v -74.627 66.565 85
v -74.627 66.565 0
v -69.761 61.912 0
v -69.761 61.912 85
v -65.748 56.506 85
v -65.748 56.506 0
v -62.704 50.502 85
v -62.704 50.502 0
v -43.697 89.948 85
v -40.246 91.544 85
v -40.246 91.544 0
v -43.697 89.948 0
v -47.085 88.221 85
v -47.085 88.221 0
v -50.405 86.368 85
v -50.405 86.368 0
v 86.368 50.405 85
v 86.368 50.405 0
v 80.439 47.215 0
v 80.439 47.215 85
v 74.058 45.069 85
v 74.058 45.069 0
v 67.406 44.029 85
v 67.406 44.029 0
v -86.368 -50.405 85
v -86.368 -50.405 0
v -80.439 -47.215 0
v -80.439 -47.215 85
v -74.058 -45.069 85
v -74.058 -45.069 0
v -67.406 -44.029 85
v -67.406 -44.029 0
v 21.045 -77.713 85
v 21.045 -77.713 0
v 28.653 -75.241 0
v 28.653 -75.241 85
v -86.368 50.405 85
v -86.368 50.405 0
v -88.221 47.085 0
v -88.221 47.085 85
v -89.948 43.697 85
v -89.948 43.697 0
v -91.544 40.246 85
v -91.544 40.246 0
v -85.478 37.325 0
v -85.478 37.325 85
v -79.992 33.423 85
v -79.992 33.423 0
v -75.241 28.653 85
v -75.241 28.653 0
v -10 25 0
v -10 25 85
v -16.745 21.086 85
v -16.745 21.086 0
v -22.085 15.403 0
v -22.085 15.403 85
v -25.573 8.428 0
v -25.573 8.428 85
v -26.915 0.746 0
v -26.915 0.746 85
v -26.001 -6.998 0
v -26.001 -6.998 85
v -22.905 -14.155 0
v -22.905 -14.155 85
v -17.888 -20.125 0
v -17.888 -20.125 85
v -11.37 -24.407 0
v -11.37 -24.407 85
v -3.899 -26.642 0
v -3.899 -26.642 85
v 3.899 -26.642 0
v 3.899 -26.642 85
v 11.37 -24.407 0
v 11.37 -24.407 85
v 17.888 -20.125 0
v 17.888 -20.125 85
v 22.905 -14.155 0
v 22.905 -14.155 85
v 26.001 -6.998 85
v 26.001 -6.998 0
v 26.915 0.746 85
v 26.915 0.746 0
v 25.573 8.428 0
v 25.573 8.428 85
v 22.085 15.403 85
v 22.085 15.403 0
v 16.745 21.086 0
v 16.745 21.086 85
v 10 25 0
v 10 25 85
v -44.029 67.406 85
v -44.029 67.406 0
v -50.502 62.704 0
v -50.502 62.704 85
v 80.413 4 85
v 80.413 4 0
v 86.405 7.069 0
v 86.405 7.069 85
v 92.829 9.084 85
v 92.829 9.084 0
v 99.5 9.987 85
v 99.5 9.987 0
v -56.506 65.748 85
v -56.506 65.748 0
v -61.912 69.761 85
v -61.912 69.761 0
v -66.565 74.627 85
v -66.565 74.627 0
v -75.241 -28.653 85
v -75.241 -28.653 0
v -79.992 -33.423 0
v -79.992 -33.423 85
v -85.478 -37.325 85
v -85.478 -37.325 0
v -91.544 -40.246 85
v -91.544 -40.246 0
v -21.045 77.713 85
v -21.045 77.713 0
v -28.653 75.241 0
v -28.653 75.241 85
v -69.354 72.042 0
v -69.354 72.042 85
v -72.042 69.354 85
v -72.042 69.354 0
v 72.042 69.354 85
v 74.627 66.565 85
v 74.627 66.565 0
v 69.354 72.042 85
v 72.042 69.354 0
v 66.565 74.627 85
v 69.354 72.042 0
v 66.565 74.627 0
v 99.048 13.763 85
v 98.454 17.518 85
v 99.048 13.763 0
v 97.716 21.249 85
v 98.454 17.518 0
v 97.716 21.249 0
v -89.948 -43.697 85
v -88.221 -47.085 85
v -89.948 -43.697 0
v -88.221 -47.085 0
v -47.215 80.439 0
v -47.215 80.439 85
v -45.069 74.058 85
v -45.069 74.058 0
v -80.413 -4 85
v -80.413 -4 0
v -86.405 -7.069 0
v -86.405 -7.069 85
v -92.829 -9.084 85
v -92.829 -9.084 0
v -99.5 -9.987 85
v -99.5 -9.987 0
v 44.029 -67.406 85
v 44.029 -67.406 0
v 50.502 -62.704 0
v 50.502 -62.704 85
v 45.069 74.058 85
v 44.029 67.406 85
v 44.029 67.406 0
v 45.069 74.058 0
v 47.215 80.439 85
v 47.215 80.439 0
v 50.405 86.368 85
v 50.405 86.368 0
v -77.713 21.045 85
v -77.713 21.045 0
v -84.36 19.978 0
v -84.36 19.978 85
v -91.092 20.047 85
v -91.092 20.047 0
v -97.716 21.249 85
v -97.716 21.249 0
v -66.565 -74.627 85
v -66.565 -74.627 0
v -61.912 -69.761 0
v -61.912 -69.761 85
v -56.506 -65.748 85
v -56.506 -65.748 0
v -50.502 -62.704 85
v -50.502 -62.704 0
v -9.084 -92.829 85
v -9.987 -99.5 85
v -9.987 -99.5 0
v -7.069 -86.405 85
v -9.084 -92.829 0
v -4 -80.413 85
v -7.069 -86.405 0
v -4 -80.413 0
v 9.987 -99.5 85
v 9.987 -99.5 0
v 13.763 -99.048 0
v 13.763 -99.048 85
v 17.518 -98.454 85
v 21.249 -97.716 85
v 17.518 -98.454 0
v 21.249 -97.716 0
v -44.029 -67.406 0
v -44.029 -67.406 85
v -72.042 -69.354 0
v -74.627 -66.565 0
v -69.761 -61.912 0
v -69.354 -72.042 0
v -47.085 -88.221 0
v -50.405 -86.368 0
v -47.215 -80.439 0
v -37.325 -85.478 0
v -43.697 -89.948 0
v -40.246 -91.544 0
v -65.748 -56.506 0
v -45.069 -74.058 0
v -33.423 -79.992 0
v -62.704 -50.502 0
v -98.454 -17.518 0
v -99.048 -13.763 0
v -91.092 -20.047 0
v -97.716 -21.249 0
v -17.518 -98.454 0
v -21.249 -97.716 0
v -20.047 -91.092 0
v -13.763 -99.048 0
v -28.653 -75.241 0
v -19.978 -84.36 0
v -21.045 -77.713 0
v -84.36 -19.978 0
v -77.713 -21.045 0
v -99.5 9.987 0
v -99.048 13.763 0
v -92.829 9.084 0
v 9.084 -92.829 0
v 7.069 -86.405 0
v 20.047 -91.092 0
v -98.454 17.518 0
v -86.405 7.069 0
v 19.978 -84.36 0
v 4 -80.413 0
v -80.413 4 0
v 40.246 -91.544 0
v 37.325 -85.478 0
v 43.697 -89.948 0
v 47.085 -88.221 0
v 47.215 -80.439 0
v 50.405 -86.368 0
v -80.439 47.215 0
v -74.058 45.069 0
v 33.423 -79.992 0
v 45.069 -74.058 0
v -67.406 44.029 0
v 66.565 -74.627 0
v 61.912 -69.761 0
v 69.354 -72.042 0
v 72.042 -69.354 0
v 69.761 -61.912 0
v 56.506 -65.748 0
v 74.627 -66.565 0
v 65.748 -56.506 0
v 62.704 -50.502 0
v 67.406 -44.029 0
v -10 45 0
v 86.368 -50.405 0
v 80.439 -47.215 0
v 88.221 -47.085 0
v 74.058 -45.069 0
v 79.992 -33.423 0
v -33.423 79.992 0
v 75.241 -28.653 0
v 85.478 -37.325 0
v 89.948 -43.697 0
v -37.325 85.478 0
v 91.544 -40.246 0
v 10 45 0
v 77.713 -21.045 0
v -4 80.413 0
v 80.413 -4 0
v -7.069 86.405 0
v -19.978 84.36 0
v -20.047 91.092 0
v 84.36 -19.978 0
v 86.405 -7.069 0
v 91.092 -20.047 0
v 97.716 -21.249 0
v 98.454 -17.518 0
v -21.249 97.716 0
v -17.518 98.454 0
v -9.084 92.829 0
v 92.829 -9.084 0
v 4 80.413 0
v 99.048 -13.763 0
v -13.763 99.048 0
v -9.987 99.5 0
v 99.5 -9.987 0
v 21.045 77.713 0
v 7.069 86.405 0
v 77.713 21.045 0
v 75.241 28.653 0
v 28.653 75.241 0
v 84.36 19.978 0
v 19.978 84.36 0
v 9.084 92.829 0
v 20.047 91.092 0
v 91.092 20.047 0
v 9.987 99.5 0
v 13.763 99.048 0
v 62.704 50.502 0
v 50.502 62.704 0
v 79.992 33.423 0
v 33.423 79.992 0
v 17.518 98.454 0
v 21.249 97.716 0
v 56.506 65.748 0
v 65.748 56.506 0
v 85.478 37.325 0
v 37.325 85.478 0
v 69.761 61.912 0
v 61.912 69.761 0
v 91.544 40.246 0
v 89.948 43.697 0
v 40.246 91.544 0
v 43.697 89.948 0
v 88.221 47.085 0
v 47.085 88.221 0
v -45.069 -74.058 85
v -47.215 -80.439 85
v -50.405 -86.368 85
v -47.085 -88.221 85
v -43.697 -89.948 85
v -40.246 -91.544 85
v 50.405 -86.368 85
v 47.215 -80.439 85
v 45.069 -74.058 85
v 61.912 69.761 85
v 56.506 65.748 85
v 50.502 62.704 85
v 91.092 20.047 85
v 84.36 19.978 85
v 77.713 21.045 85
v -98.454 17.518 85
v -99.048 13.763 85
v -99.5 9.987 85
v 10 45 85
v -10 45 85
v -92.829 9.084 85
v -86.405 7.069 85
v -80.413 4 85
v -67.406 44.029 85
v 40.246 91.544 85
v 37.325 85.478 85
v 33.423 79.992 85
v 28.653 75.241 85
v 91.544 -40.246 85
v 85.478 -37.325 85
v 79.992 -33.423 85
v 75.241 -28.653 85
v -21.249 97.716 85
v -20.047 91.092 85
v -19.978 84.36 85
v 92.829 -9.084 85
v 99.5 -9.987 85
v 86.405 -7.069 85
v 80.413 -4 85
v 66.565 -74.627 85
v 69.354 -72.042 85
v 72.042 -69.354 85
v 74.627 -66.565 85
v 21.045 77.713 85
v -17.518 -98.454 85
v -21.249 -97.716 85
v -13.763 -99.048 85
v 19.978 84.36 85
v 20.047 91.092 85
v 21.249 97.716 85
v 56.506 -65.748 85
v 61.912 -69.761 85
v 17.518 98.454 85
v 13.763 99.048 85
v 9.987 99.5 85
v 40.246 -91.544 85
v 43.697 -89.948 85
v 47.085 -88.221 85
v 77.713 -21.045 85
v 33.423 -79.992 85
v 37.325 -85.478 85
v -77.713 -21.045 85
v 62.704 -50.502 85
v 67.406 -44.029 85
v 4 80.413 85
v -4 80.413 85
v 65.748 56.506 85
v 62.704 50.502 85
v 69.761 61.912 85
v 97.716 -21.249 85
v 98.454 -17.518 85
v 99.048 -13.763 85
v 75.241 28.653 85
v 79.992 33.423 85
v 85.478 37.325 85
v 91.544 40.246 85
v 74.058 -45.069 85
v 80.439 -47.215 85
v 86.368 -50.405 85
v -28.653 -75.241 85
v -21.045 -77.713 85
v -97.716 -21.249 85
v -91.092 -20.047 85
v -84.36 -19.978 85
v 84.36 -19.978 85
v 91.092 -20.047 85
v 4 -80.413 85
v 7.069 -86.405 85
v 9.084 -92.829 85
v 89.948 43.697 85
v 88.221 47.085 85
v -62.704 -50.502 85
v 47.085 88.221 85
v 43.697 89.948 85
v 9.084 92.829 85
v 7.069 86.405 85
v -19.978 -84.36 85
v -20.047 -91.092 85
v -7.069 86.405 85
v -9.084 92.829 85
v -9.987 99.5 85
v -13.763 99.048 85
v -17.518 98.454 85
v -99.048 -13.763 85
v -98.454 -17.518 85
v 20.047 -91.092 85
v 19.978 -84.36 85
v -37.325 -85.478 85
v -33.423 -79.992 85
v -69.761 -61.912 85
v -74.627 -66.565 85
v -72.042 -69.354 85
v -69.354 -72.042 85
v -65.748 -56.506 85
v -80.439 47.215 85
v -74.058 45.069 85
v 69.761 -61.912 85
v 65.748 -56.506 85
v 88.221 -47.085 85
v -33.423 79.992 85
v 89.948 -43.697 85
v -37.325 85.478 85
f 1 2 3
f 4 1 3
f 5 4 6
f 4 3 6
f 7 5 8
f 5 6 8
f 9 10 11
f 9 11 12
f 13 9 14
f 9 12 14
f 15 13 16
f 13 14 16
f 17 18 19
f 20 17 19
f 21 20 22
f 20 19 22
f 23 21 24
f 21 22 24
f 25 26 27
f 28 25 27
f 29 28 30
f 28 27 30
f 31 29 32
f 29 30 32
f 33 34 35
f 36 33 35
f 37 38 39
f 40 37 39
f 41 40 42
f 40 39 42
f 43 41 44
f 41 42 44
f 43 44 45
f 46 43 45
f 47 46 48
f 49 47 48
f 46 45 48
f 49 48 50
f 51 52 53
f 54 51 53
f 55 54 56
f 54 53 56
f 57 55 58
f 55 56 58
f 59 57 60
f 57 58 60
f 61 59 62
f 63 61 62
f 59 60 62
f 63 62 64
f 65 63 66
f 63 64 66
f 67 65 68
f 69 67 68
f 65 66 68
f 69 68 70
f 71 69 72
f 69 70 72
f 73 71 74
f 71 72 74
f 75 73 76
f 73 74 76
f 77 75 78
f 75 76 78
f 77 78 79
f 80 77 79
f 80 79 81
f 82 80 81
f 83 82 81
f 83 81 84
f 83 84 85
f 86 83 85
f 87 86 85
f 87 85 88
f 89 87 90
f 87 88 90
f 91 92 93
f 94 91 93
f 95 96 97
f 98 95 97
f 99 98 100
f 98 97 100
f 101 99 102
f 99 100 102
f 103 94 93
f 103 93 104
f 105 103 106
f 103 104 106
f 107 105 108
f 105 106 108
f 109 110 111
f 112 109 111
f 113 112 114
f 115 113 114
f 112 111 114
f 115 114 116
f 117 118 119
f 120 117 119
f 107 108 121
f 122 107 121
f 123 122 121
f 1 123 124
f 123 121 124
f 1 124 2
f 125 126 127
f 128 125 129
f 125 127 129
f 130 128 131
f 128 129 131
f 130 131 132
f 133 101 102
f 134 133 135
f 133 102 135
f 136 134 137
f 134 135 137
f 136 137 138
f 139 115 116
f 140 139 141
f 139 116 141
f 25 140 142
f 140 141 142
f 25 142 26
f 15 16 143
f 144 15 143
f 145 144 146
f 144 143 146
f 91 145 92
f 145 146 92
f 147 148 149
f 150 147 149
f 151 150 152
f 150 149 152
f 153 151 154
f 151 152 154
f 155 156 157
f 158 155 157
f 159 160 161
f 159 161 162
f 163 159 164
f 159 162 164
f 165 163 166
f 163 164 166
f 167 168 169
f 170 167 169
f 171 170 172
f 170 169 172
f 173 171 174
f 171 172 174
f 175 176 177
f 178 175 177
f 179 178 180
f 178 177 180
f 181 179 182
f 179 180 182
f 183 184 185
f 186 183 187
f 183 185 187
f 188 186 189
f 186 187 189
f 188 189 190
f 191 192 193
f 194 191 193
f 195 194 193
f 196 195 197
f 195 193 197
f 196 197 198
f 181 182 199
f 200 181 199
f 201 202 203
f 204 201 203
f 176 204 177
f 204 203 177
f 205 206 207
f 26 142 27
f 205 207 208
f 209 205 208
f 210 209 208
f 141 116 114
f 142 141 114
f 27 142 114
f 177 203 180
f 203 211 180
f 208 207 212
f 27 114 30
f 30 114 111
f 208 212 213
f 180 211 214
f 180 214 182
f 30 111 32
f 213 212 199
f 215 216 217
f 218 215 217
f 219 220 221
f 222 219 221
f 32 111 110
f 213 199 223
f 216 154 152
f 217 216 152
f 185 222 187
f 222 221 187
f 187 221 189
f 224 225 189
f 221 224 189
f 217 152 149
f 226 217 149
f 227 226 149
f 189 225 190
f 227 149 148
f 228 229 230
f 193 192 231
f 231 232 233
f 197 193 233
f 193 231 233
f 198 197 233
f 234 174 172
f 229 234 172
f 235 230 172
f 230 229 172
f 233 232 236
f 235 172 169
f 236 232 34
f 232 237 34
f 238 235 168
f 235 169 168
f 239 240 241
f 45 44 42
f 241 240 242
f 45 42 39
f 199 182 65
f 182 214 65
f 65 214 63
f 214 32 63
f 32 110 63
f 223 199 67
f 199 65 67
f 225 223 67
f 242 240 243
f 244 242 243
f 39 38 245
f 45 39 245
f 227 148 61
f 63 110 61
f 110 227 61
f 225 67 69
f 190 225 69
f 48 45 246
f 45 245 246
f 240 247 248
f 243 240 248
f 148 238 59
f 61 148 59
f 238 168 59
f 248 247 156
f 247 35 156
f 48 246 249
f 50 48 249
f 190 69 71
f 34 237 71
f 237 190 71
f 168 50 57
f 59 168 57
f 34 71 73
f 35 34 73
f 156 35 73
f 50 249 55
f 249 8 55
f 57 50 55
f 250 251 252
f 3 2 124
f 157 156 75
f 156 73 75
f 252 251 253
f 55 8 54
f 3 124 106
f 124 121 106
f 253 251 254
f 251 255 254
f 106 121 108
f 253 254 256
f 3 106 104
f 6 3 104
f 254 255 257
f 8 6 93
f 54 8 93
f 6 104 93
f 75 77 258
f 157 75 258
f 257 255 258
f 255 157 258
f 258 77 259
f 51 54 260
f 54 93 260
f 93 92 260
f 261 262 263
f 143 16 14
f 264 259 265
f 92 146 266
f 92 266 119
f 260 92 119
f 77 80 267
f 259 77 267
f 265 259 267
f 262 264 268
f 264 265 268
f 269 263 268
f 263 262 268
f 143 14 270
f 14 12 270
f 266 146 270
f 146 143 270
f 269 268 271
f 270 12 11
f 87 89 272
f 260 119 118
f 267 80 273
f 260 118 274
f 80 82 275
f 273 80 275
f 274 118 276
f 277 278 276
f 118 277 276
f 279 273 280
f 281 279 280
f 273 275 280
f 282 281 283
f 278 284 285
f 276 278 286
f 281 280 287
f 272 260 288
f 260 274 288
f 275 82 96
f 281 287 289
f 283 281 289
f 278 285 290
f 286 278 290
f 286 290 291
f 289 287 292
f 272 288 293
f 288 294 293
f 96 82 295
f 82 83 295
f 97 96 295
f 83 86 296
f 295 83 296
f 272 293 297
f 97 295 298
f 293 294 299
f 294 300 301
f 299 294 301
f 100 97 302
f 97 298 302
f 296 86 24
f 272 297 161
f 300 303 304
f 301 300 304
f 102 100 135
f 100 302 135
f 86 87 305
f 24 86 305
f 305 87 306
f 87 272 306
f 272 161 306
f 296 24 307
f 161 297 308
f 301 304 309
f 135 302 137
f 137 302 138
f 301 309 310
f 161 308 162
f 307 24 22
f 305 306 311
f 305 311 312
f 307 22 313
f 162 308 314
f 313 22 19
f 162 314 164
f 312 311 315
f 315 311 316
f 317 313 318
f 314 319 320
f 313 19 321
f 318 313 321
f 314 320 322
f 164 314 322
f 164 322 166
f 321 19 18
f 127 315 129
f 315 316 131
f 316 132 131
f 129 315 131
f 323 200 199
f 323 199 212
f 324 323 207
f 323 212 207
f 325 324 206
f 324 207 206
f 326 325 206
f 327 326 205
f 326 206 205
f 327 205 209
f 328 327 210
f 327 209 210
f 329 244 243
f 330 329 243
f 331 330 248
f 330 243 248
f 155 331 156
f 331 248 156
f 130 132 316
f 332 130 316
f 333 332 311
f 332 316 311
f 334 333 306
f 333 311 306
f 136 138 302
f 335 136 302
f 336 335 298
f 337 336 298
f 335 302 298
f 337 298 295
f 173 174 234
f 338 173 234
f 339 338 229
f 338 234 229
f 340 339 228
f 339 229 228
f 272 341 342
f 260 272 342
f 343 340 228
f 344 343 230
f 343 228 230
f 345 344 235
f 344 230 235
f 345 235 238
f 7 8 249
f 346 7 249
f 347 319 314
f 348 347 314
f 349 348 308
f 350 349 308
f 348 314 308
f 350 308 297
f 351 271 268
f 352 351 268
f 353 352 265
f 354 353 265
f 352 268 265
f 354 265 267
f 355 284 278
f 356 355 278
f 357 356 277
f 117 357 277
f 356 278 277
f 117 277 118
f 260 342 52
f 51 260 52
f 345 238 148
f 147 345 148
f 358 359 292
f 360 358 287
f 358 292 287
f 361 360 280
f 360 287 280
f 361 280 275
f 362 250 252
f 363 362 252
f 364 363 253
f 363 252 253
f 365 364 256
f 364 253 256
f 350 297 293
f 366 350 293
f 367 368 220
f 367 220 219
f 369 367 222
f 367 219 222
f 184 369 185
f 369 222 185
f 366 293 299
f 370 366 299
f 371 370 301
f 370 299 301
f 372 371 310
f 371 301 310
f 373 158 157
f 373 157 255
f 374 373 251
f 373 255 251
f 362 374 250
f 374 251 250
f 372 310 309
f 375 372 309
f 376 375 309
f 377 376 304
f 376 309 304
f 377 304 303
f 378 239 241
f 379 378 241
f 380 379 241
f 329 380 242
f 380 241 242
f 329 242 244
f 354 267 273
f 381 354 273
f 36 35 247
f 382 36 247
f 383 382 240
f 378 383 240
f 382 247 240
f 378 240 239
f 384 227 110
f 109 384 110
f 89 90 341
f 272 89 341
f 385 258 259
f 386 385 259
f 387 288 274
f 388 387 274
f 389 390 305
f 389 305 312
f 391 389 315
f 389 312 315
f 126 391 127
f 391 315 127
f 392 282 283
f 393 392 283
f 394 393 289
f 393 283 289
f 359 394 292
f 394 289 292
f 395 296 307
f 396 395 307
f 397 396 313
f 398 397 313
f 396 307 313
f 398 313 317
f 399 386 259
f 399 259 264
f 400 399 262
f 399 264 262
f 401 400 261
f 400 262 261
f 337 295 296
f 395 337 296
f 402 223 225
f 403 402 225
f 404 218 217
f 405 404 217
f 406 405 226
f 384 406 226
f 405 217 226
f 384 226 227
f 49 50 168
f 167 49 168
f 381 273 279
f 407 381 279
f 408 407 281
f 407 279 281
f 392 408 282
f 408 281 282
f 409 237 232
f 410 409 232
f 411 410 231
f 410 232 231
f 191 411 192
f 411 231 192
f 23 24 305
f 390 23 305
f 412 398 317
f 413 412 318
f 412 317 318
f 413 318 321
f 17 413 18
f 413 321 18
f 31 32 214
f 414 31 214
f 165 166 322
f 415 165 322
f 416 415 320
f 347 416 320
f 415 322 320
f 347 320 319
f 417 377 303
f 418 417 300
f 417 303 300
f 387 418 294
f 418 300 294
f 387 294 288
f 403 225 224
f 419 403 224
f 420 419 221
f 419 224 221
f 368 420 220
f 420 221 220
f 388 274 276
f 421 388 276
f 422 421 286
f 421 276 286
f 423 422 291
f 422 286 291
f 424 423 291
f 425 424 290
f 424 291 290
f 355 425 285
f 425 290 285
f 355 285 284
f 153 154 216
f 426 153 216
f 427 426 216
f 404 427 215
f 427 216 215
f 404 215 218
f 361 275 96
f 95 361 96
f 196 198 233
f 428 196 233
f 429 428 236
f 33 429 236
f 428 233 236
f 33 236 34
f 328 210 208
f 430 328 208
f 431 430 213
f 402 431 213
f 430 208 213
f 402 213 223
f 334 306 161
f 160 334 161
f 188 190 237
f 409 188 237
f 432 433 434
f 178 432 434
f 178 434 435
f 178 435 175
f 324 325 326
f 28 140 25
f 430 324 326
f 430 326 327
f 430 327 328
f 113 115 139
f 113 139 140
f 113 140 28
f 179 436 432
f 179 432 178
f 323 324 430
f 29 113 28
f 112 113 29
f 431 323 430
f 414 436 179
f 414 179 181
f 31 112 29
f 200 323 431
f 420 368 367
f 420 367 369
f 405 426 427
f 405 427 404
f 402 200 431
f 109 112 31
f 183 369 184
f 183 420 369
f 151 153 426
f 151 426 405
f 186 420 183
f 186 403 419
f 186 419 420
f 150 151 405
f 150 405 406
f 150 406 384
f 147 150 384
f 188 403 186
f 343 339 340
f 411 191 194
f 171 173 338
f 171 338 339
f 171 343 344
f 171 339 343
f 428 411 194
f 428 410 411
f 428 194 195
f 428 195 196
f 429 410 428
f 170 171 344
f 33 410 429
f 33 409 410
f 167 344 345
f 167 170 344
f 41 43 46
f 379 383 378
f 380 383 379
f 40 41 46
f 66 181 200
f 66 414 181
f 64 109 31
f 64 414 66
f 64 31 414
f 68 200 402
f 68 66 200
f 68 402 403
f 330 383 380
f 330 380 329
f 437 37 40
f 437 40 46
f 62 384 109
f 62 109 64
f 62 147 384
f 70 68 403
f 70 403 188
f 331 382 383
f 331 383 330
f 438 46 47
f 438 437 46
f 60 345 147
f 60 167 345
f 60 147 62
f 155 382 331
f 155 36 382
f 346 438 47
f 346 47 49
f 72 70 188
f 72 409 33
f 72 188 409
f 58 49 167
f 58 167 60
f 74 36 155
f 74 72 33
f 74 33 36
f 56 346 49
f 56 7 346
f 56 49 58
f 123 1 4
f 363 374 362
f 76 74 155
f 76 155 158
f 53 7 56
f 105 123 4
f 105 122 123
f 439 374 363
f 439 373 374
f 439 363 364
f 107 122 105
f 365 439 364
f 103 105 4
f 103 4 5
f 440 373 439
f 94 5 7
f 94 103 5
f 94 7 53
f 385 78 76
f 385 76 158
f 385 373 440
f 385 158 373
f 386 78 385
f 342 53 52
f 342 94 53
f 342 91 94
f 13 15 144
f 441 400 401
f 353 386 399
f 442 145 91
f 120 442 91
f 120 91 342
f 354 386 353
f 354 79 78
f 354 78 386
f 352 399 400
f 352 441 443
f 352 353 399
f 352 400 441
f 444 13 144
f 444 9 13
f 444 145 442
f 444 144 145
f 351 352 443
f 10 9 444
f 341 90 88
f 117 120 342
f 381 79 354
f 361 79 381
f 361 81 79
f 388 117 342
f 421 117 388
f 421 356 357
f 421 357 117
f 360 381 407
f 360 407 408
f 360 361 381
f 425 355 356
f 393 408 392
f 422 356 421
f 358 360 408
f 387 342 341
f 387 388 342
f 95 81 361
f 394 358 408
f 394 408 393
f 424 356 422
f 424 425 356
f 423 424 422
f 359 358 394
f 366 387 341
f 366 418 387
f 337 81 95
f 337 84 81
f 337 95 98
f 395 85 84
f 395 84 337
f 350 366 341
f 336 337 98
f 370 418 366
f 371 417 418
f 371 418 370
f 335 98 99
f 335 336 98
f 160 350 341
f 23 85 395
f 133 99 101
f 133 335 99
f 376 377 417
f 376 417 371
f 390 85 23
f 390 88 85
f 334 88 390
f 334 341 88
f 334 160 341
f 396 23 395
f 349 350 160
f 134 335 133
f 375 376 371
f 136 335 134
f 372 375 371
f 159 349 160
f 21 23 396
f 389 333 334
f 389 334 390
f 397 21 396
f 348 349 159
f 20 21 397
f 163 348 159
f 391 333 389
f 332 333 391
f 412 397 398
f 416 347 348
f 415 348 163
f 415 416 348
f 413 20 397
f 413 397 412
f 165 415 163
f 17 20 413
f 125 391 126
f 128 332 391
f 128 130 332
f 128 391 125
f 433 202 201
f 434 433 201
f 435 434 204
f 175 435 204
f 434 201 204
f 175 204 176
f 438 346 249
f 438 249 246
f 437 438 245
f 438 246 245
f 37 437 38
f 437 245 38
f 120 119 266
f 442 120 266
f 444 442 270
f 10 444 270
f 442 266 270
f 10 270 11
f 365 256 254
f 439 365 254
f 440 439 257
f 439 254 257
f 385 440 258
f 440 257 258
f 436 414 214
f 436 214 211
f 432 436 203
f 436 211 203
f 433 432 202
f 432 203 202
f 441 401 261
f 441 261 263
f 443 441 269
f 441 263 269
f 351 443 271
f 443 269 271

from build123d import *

# Parameters (mm, degrees)
SKETCH1_R           = 100
BOSS_EXTRUDE1_DEPTH = 85
CUT_EXTRUDE2_DEPTH  = 85
CUT_EXTRUDE17_DEPTH = 144


with BuildPart() as part:
    # Sketch1 → Boss-Extrude1 (new body)
    with BuildSketch(Plane.XY):
        Circle(SKETCH1_R)
    extrude(amount=BOSS_EXTRUDE1_DEPTH)

    # Sketch2 → Cut-Extrude2 (cut)
    with BuildSketch(Plane.XY.offset(85)):
        with BuildLine():
            Line((0, 45), (-10, 45))
            Line((-10, 45), (-10, 25))
            ThreePointArc((-10, 25), (0, -26.925824036), (10, 25))
            Line((10, 25), (10, 45))
            Line((10, 45), (0, 45))
        make_face()
    extrude(amount=-CUT_EXTRUDE2_DEPTH, mode=Mode.SUBTRACT)

    # Sketch3 → Cut-Extrude17 (cut)
    with BuildSketch(Plane.XY):
        with BuildLine():
            Line((4, 80.412826854), (-4, 80.412826854))
            ThreePointArc((-4, 80.412826854), (-8.212095444, 89.574227067), (-9.987492178, 99.5))
            ThreePointArc((-9.987492178, 99.5), (0, 110), (9.987492178, 99.5))
            ThreePointArc((9.987492178, 99.5), (8.212095444, 89.574227067), (4, 80.412826854))
        make_face()
        with BuildLine():
            Line((28.653156129, 75.241074996), (21.044703998, 77.713210951))
            ThreePointArc((21.044703998, 77.713210951), (19.869791537, 87.727829396), (21.248521423, 97.716428185))
            ThreePointArc((21.248521423, 97.716428185), (33.991869381, 104.616216792), (40.245860457, 91.543818557))
            ThreePointArc((40.245860457, 91.543818557), (35.490125306, 82.652475292), (28.653156129, 75.241074996))
        make_face()
        with BuildLine():
            Line((50.501541697, 62.704202481), (44.029405742, 67.4064845))
            ThreePointArc((44.029405742, 67.4064845), (46.006684882, 77.294020547), (50.4045817, 86.36769155))
            ThreePointArc((50.4045817, 86.36769155), (64.656377752, 88.991869381), (66.564683506, 74.626690331))
            ThreePointArc((66.564683506, 74.626690331), (59.294134429, 67.640123362), (50.501541697, 62.704202481))
        make_face()
        with BuildLine():
            Line((67.4064845, 44.029405742), (62.704202481, 50.501541697))
            ThreePointArc((62.704202481, 50.501541697), (67.640123362, 59.294134429), (74.626690331, 66.564683506))
            ThreePointArc((74.626690331, 66.564683506), (88.991869381, 64.656377752), (86.36769155, 50.4045817))
            ThreePointArc((86.36769155, 50.4045817), (77.294020547, 46.006684882), (67.4064845, 44.029405742))
        make_face()
        with BuildLine():
            Line((77.713210951, 21.044703998), (75.241074996, 28.653156129))
            ThreePointArc((75.241074996, 28.653156129), (82.652475292, 35.490125306), (91.543818557, 40.245860457))
            ThreePointArc((91.543818557, 40.245860457), (104.616216792, 33.991869381), (97.716428185, 21.248521423))
            ThreePointArc((97.716428185, 21.248521423), (87.727829396, 19.869791537), (77.713210951, 21.044703998))
        make_face()
        with BuildLine():
            Line((80.412826854, -4), (80.412826854, 4))
            ThreePointArc((80.412826854, 4), (89.574227067, 8.212095444), (99.5, 9.987492178))
            ThreePointArc((99.5, 9.987492178), (110, 0), (99.5, -9.987492178))
            ThreePointArc((99.5, -9.987492178), (89.574227067, -8.212095444), (80.412826854, -4))
        make_face()
        with BuildLine():
            Line((75.241074996, -28.653156129), (77.713210951, -21.044703998))
            ThreePointArc((77.713210951, -21.044703998), (87.727829396, -19.869791537), (97.716428185, -21.248521423))
            ThreePointArc((97.716428185, -21.248521423), (104.616216792, -33.991869381), (91.543818557, -40.245860457))
            ThreePointArc((91.543818557, -40.245860457), (82.652475292, -35.490125306), (75.241074996, -28.653156129))
        make_face()
        with BuildLine():
            Line((62.704202481, -50.501541697), (67.4064845, -44.029405742))
            ThreePointArc((67.4064845, -44.029405742), (77.294020547, -46.006684882), (86.36769155, -50.4045817))
            ThreePointArc((86.36769155, -50.4045817), (88.991869381, -64.656377752), (74.626690331, -66.564683506))
            ThreePointArc((74.626690331, -66.564683506), (67.640123362, -59.294134429), (62.704202481, -50.501541697))
        make_face()
        with BuildLine():
            Line((44.029405742, -67.4064845), (50.501541697, -62.704202481))
            ThreePointArc((50.501541697, -62.704202481), (59.294134429, -67.640123362), (66.564683506, -74.626690331))
            ThreePointArc((66.564683506, -74.626690331), (64.656377752, -88.991869381), (50.4045817, -86.36769155))
            ThreePointArc((50.4045817, -86.36769155), (46.006684882, -77.294020547), (44.029405742, -67.4064845))
        make_face()
        with BuildLine():
            Line((21.044703998, -77.713210951), (28.653156129, -75.241074996))
            ThreePointArc((28.653156129, -75.241074996), (35.490125306, -82.652475292), (40.245860457, -91.543818557))
            ThreePointArc((40.245860457, -91.543818557), (33.991869381, -104.616216792), (21.248521423, -97.716428185))
            ThreePointArc((21.248521423, -97.716428185), (19.869791537, -87.727829396), (21.044703998, -77.713210951))
        make_face()
        with BuildLine():
            Line((-4, -80.412826854), (4, -80.412826854))
            ThreePointArc((4, -80.412826854), (8.212095444, -89.574227067), (9.987492178, -99.5))
            ThreePointArc((9.987492178, -99.5), (0, -110), (-9.987492178, -99.5))
            ThreePointArc((-9.987492178, -99.5), (-8.212095444, -89.574227067), (-4, -80.412826854))
        make_face()
        with BuildLine():
            Line((-28.653156129, -75.241074996), (-21.044703998, -77.713210951))
            ThreePointArc((-21.044703998, -77.713210951), (-19.869791537, -87.727829396), (-21.248521423, -97.716428185))
            ThreePointArc((-21.248521423, -97.716428185), (-33.991869381, -104.616216792), (-40.245860457, -91.543818557))
            ThreePointArc((-40.245860457, -91.543818557), (-35.490125306, -82.652475292), (-28.653156129, -75.241074996))
        make_face()
        with BuildLine():
            Line((-50.501541697, -62.704202481), (-44.029405742, -67.4064845))
            ThreePointArc((-44.029405742, -67.4064845), (-46.006684882, -77.294020547), (-50.4045817, -86.36769155))
            ThreePointArc((-50.4045817, -86.36769155), (-64.656377752, -88.991869381), (-66.564683506, -74.626690331))
            ThreePointArc((-66.564683506, -74.626690331), (-59.294134429, -67.640123362), (-50.501541697, -62.704202481))
        make_face()
        with BuildLine():
            Line((-67.4064845, -44.029405742), (-62.704202481, -50.501541697))
            ThreePointArc((-62.704202481, -50.501541697), (-67.640123362, -59.294134429), (-74.626690331, -66.564683506))
            ThreePointArc((-74.626690331, -66.564683506), (-88.991869381, -64.656377752), (-86.36769155, -50.4045817))
            ThreePointArc((-86.36769155, -50.4045817), (-77.294020547, -46.006684882), (-67.4064845, -44.029405742))
        make_face()
        with BuildLine():
            Line((-77.713210951, -21.044703998), (-75.241074996, -28.653156129))
            ThreePointArc((-75.241074996, -28.653156129), (-82.652475292, -35.490125306), (-91.543818557, -40.245860457))
            ThreePointArc((-91.543818557, -40.245860457), (-104.616216792, -33.991869381), (-97.716428185, -21.248521423))
            ThreePointArc((-97.716428185, -21.248521423), (-87.727829396, -19.869791537), (-77.713210951, -21.044703998))
        make_face()
        with BuildLine():
            Line((-80.412826854, 4), (-80.412826854, -4))
            ThreePointArc((-80.412826854, -4), (-89.574227067, -8.212095444), (-99.5, -9.987492178))
            ThreePointArc((-99.5, -9.987492178), (-110, 0), (-99.5, 9.987492178))
            ThreePointArc((-99.5, 9.987492178), (-89.574227067, 8.212095444), (-80.412826854, 4))
        make_face()
        with BuildLine():
            Line((-75.241074996, 28.653156129), (-77.713210951, 21.044703998))
            ThreePointArc((-77.713210951, 21.044703998), (-87.727829396, 19.869791537), (-97.716428185, 21.248521423))
            ThreePointArc((-97.716428185, 21.248521423), (-104.616216792, 33.991869381), (-91.543818557, 40.245860457))
            ThreePointArc((-91.543818557, 40.245860457), (-82.652475292, 35.490125306), (-75.241074996, 28.653156129))
        make_face()
        with BuildLine():
            Line((-62.704202481, 50.501541697), (-67.4064845, 44.029405742))
            ThreePointArc((-67.4064845, 44.029405742), (-77.294020547, 46.006684882), (-86.36769155, 50.4045817))
            ThreePointArc((-86.36769155, 50.4045817), (-88.991869381, 64.656377752), (-74.626690331, 66.564683506))
            ThreePointArc((-74.626690331, 66.564683506), (-67.640123362, 59.294134429), (-62.704202481, 50.501541697))
        make_face()
        with BuildLine():
            Line((-44.029405742, 67.4064845), (-50.501541697, 62.704202481))
            ThreePointArc((-50.501541697, 62.704202481), (-59.294134429, 67.640123362), (-66.564683506, 74.626690331))
            ThreePointArc((-66.564683506, 74.626690331), (-64.656377752, 88.991869381), (-50.4045817, 86.36769155))
            ThreePointArc((-50.4045817, 86.36769155), (-46.006684882, 77.294020547), (-44.029405742, 67.4064845))
        make_face()
        with BuildLine():
            Line((-21.044703998, 77.713210951), (-28.653156129, 75.241074996))
            ThreePointArc((-28.653156129, 75.241074996), (-35.490125306, 82.652475292), (-40.245860457, 91.543818557))
            ThreePointArc((-40.245860457, 91.543818557), (-33.991869381, 104.616216792), (-21.248521423, 97.716428185))
            ThreePointArc((-21.248521423, 97.716428185), (-19.869791537, 87.727829396), (-21.044703998, 77.713210951))
        make_face()
    extrude(amount=CUT_EXTRUDE17_DEPTH, mode=Mode.SUBTRACT)


solid = part.part
